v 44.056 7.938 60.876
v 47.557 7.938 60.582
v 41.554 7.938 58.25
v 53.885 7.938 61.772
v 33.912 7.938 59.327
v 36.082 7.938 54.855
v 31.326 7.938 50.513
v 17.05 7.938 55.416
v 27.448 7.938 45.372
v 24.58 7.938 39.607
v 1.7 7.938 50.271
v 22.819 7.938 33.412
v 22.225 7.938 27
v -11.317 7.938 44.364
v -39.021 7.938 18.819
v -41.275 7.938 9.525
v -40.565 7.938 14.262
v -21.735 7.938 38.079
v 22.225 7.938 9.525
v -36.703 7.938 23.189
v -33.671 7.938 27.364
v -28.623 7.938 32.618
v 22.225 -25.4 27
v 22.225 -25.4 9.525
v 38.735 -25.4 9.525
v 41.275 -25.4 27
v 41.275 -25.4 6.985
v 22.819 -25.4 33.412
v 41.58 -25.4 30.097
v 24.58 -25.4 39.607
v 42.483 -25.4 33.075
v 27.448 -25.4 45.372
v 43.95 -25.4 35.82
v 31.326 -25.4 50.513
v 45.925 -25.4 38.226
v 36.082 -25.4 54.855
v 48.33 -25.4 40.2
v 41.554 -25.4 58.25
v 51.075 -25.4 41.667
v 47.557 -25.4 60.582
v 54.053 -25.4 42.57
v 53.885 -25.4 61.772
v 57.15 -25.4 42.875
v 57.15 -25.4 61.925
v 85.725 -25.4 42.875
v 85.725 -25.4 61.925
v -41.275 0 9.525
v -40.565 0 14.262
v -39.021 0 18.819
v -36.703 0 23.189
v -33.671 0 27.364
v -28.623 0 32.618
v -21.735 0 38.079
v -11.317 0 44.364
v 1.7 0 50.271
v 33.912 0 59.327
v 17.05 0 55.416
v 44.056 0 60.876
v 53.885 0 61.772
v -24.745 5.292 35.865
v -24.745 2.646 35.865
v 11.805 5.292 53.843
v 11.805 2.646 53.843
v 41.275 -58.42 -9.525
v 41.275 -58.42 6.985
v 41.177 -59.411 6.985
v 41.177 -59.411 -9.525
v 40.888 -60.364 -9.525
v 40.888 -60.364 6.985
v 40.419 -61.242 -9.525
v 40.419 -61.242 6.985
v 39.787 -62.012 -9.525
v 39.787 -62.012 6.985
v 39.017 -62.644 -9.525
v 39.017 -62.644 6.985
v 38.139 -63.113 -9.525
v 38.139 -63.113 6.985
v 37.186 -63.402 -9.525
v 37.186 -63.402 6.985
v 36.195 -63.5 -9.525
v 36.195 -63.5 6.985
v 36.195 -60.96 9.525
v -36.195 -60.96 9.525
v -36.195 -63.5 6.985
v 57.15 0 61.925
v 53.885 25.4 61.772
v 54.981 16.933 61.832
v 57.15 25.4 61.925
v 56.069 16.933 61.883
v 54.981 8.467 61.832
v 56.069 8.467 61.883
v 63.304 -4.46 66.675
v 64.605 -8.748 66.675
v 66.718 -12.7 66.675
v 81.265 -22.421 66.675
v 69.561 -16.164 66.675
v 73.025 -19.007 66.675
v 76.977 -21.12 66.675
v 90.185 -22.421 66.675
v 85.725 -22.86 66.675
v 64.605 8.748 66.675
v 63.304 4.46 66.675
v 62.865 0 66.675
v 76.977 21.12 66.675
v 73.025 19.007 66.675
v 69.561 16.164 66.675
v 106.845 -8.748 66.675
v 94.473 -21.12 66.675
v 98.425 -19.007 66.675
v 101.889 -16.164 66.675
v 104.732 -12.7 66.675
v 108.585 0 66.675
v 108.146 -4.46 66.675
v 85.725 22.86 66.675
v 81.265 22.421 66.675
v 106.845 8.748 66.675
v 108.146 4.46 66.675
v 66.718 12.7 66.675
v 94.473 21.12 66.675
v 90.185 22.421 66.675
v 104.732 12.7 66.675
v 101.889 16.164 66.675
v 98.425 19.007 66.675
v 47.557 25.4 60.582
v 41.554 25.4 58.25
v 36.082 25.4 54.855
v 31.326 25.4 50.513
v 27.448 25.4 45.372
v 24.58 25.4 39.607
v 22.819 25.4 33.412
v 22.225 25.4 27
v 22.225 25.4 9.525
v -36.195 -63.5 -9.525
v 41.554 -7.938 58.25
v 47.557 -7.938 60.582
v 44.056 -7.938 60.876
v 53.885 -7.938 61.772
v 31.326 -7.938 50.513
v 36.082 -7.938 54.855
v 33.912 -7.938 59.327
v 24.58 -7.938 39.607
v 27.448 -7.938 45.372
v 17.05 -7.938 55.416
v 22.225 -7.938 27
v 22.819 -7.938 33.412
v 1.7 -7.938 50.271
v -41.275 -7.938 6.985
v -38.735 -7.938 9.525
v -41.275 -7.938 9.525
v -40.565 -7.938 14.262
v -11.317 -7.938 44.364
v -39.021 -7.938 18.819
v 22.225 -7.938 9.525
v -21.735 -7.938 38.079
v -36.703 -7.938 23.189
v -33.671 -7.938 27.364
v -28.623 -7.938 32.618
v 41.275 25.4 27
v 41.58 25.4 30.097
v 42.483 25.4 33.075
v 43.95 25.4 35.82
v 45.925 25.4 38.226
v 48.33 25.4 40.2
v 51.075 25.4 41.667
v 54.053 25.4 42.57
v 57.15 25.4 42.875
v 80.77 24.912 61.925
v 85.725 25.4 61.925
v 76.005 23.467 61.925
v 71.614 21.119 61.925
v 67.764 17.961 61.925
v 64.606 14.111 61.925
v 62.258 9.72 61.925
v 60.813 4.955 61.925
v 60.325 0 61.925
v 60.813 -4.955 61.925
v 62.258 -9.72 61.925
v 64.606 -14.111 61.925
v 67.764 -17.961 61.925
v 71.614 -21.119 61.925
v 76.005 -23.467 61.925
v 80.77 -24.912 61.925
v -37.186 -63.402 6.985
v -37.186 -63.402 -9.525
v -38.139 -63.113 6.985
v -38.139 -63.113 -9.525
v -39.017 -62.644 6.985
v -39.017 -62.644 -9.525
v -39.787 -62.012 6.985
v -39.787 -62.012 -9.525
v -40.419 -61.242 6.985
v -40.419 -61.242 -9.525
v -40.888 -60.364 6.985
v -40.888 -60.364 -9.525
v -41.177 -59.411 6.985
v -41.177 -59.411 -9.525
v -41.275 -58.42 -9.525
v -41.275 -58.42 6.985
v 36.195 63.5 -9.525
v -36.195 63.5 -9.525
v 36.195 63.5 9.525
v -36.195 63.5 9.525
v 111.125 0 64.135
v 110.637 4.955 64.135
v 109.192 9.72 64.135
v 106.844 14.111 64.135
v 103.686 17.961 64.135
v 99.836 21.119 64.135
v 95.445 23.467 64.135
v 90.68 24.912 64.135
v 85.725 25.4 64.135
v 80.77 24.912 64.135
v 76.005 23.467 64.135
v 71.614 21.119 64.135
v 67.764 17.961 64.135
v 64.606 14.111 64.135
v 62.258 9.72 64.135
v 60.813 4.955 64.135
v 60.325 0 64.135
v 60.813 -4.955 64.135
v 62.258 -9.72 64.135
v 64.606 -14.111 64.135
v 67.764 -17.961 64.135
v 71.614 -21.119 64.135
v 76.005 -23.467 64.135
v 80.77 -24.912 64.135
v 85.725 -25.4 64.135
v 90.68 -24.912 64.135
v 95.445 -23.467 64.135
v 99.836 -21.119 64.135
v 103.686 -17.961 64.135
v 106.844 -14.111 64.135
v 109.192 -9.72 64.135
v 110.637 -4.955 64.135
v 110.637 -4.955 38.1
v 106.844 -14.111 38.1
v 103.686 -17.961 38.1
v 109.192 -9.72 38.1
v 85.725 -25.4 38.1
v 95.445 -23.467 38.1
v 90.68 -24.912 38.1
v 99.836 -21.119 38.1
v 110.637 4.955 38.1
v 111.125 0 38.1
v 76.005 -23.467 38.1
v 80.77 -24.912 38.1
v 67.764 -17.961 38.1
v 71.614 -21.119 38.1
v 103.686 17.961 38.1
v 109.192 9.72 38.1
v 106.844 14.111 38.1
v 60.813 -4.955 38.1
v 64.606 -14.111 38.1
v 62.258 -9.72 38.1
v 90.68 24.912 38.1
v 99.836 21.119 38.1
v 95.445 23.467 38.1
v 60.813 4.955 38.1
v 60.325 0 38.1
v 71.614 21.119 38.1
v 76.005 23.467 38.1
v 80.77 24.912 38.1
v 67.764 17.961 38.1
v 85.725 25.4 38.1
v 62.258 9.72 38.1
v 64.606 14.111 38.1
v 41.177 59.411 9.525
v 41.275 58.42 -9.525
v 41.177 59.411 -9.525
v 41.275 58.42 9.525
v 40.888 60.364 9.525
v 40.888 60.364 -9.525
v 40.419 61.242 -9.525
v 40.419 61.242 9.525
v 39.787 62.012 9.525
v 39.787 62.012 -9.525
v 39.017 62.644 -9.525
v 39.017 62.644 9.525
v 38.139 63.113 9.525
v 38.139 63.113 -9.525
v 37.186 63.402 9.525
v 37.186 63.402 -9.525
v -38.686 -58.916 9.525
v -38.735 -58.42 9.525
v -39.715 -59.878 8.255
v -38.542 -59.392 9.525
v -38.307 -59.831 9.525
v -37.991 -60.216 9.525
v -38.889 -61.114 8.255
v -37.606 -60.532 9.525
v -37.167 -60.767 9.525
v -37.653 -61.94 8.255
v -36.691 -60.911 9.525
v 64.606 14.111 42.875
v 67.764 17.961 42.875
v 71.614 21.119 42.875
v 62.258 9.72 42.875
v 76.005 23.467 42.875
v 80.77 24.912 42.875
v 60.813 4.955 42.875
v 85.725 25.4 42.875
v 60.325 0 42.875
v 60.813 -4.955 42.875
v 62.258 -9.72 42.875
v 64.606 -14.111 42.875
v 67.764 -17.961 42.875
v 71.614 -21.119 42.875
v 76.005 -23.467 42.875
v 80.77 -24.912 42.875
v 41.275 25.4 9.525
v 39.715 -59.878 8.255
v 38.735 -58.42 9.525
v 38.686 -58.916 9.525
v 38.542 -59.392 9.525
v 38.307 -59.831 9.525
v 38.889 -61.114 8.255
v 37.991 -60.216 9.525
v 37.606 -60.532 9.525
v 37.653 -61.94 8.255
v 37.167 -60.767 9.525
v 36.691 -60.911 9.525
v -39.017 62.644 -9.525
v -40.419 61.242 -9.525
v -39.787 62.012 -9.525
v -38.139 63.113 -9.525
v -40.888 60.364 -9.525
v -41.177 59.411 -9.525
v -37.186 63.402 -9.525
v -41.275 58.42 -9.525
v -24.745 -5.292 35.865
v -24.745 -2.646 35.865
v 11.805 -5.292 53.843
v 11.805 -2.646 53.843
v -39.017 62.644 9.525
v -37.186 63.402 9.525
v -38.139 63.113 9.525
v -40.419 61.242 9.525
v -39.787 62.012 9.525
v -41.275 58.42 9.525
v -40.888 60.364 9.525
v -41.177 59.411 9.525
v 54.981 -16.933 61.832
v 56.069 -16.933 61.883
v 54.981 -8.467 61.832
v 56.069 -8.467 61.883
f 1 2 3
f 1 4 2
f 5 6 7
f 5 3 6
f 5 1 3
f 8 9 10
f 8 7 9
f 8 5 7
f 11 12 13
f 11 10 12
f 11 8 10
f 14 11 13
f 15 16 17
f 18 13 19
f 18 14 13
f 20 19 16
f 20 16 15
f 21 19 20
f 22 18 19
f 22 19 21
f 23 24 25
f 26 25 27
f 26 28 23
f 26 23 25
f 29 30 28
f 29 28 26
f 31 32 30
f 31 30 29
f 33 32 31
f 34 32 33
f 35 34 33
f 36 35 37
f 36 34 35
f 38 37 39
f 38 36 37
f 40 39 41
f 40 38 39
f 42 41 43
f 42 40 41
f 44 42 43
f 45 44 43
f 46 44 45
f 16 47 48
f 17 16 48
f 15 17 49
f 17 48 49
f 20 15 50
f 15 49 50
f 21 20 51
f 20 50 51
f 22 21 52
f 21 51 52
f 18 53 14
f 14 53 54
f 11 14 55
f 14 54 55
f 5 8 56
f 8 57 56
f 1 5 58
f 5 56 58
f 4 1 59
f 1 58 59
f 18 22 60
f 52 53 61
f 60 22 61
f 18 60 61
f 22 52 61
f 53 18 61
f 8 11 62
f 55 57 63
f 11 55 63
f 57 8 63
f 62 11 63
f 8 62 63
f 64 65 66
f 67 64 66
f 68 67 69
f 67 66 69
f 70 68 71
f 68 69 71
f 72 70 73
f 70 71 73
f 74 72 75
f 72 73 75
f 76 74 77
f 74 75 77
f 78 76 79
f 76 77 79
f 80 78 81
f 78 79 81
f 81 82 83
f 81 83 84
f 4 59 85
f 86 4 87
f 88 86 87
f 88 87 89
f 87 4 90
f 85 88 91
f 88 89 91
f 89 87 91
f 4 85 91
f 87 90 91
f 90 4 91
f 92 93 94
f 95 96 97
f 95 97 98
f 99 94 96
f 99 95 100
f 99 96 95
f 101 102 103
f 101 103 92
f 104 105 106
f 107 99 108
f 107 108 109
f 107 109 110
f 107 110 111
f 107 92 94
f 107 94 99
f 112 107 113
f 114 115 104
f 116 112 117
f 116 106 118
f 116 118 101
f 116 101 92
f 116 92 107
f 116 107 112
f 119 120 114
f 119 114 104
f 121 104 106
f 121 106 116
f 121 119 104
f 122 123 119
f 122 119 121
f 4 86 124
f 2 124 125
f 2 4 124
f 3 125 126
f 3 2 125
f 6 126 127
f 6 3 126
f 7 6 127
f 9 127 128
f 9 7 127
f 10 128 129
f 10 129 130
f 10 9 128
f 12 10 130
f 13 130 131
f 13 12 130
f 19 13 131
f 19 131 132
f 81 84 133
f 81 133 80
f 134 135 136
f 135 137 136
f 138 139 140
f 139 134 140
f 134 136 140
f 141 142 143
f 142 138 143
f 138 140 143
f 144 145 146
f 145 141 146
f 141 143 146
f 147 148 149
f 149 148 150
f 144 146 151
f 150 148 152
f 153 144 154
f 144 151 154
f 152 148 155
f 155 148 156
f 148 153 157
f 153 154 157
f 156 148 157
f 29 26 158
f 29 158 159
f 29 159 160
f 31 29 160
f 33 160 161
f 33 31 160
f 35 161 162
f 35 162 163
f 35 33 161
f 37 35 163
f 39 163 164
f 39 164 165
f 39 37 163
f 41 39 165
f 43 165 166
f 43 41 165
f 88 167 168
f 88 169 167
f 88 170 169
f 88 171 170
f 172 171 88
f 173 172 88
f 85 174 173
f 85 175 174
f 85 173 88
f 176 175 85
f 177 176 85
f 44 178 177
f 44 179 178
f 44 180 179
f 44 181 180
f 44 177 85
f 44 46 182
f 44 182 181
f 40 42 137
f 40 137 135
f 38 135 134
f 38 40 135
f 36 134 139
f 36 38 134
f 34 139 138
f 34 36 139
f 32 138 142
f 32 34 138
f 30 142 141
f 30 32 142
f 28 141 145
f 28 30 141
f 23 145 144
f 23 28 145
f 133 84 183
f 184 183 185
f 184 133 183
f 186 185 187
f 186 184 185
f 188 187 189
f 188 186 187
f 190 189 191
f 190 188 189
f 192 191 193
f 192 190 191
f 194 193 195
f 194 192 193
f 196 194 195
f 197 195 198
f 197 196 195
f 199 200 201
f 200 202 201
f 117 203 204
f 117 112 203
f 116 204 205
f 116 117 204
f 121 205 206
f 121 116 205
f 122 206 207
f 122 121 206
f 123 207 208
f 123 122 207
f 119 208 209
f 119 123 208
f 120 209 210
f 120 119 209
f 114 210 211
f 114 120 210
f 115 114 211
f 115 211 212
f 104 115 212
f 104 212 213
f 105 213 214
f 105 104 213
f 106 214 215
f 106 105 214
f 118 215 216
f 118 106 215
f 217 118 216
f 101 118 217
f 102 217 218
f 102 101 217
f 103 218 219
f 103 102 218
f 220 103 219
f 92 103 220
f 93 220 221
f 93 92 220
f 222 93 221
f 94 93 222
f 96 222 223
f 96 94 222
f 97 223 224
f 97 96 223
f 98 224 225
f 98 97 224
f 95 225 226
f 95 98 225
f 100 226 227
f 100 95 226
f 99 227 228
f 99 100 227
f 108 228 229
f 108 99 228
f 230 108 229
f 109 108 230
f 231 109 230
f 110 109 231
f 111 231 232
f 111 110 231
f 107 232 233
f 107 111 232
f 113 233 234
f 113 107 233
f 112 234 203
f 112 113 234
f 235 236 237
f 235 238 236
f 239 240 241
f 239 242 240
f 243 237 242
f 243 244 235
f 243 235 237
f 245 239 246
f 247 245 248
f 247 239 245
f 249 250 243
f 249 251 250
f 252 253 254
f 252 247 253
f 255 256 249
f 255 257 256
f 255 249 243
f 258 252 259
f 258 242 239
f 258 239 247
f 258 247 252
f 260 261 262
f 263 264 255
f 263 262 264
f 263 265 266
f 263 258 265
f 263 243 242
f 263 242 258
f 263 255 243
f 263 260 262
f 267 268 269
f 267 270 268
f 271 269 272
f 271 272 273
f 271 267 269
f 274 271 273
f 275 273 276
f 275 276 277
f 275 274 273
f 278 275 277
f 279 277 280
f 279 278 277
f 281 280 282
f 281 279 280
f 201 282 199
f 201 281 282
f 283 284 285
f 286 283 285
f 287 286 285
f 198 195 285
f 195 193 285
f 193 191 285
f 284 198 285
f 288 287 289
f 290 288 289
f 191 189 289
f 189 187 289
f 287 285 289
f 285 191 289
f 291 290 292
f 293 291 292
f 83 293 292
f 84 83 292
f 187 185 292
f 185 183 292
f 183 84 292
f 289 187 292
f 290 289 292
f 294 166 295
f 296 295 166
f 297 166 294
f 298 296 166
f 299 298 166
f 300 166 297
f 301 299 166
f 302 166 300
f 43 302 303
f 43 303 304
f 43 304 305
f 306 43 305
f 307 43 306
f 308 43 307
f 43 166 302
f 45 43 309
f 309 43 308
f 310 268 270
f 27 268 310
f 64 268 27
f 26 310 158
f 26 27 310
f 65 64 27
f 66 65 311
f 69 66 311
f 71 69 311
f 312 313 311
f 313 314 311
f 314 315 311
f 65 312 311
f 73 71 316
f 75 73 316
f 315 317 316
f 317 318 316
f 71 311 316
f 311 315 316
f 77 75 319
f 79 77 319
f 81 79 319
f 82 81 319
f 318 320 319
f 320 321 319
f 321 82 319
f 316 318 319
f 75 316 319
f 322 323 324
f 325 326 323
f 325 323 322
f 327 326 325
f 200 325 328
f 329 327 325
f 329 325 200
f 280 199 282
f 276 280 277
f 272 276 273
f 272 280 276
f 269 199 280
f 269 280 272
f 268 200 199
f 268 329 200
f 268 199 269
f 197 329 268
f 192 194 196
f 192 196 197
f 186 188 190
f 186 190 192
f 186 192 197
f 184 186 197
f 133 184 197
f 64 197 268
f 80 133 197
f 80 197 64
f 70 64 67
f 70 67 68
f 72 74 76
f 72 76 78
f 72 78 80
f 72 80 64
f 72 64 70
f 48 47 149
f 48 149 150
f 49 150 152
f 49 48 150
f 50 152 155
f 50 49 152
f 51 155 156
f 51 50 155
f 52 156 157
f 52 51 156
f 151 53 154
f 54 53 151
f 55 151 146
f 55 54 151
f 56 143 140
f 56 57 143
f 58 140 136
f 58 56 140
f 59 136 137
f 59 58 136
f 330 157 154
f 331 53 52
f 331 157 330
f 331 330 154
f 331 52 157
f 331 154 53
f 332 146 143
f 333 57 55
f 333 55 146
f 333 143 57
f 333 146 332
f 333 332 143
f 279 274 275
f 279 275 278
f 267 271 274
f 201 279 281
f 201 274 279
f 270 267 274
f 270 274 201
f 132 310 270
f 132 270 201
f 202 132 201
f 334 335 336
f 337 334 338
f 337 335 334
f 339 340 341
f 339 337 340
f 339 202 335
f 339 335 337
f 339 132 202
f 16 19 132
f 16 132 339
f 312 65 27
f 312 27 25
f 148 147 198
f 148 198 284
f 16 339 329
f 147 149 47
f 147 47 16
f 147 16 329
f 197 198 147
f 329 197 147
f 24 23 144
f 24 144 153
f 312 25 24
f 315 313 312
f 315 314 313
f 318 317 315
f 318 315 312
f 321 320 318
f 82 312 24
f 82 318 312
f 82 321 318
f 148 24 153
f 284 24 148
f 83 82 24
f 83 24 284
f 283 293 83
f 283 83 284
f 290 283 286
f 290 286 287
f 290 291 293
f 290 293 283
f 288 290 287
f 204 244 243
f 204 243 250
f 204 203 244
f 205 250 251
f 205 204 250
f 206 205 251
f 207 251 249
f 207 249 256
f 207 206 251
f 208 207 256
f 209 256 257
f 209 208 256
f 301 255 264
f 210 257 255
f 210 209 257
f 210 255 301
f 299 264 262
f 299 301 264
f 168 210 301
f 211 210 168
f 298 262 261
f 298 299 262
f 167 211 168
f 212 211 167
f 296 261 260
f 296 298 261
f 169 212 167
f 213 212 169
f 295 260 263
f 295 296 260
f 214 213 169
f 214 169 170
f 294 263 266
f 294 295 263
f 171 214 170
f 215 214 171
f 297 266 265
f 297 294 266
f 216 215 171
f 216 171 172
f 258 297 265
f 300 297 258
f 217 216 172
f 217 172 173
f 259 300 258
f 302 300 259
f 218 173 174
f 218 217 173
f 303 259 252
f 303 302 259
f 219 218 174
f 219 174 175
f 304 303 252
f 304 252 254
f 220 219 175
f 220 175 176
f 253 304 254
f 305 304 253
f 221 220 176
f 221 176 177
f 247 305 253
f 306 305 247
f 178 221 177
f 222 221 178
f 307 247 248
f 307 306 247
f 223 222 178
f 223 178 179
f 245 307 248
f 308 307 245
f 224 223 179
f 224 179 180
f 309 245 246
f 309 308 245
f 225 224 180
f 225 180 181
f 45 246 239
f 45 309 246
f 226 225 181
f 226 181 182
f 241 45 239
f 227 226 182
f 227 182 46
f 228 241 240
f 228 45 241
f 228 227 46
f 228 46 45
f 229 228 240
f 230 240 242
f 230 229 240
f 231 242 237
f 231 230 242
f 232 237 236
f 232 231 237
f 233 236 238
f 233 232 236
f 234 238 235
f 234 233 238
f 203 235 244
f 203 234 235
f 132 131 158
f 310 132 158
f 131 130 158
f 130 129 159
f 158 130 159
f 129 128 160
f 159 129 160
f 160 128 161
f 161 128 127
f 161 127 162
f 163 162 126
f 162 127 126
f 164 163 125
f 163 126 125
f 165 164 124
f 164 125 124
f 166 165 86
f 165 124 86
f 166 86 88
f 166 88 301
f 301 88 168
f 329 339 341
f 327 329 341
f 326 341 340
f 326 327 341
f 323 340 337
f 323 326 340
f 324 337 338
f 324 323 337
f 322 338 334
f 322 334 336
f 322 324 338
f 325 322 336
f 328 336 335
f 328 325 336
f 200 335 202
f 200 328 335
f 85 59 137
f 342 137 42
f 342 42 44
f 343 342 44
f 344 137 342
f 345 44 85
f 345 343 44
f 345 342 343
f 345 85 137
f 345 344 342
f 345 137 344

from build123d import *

# Parameters (mm, degrees)
F1_DEPTH     = 63.5
F0_W         = 25.4
F0_H         = 19.05
F2_DEPTH     = 25.4
F3_DEPTH     = 7.9375
F5_R         = 5.08
F6_T1_DEPTH  = 72.39
F6_T3_DEPTH  = 33.02
F6_T5_DEPTH  = 50.4825
F6_T10_ANGLE = 90
F6_T12_ANGLE = 90


# Not quite as in the source:
# - a fillet or chamfer that OpenCascade refuses, or shapes differently, is made with other operations: its cross-section is extruded or revolved along the edge and cut away or added


with BuildPart() as f1:
    # F0 (on Front) → F1 (new body, symmetric)
    with BuildSketch(Plane.XZ):
        Polygon((22.225, 9.525), (-41.275, 9.525), (-41.275, -9.525), (41.275, -9.525), (41.275, 9.525), align=None)
    extrude(amount=F1_DEPTH, both=True)

    # F0 (on Front) → F2 (join, symmetric)
    with BuildSketch(Plane.XZ):
        with BuildLine():
            Line((22.225, 27.0002), (22.225, 9.525))
            Line((22.225, 9.525), (41.275, 9.525))
            Line((41.275, 9.525), (41.275, 27.0002))
            ThreePointArc((41.275, 27.0002), (45.9246798487, 38.2255201513), (57.15, 42.8752))
            Line((57.15, 42.8752), (60.325, 42.8752))
            Line((60.325, 42.8752), (60.325, 61.9252))
            Line((60.325, 61.9252), (57.15, 61.9252))
            add(Edge.make_bspline(
                [(53.8854342407, 61.7722898912), (54.9842067368, 61.8365871986), (56.0728453275, 61.8876096574), (57.15, 61.9252)],
                knots=[108.5245810491, 108.5245810491, 108.5245810491, 108.5245810491, 111.5045361635, 111.5045361635, 111.5045361635, 111.5045361635], degree=3))
            ThreePointArc((53.8854342407, 61.7722898912), (31.3258777096, 50.5133948686), (22.225, 27.0002))
        make_face()
        with Locations((73.025, 52.4002)):
            Rectangle(F0_W, F0_H)
    extrude(amount=F2_DEPTH, both=True)

    # F0 (on Front) → F3 (join, symmetric)
    with BuildSketch(Plane.XZ):
        with BuildLine():
            add(Edge.make_bspline(
                [(-41.275, 9.525), (-39.5856284224, 39.4828766469), (13.870125209, 59.4306981306), (53.8854342407, 61.7722898912)],
                knots=[0, 0, 0, 0, 108.5245810491, 108.5245810491, 108.5245810491, 108.5245810491], degree=3))
            Line((-41.275, 9.525), (22.225, 9.525))
            Line((22.225, 9.525), (22.225, 27.0002))
            ThreePointArc((22.225, 27.0002), (31.3258777096, 50.5133948686), (53.8854342407, 61.7722898912))
        make_face()
    extrude(amount=F3_DEPTH, both=True)

    # F0 (on Front) → F4 (revolve)
    with BuildSketch(Plane.XZ):
        Polygon((85.725, 66.675), (85.725, 61.9252), (85.725, 42.8752), (85.725, 38.1), (111.125, 38.1), (111.125, 66.675), align=None)
    revolve(axis=Axis((85.725, 0, 52.3875), (0, 0, 1)))

    # F5
    f5_edges = [f1.edges().sort_by_distance(p)[0] for p in [
        (41.275, -63.5, 0),
        (-41.275, -63.5, 0),
        (41.275, 63.5, 0),
        (-41.275, 63.5, 0),
    ]]
    fillet(f5_edges, radius=F5_R)

    # F6: chamfer of 2.54 on 6 edges, made by hand

    # F6_s2 → F6_t1 (cut)
    with BuildSketch(Plane.YZ.offset(-36.195)):
        Polygon((-60.96, 9.525), (-63.5, 6.985), (-63.5, 9.525), align=None)
    extrude(amount=F6_T1_DEPTH, mode=Mode.SUBTRACT)

    # F6_s4 → F6_t3 (cut)
    with BuildSketch(Plane.XZ.offset(25.4)):
        Polygon((41.275, 6.985), (38.735, 9.525), (41.275, 9.525), align=None)
    extrude(amount=F6_T3_DEPTH, mode=Mode.SUBTRACT)

    # F6_s6 → F6_t5 (cut)
    with BuildSketch(Plane.XZ.offset(7.9375)):
        Polygon((-41.275, 6.985), (-38.735, 9.525), (-41.275, 9.525), align=None)
    extrude(amount=F6_T5_DEPTH, mode=Mode.SUBTRACT)

    # F6_s7 → F6_t8 (revolve, cut)
    with BuildSketch(Plane.XZ):
        Polygon((111.125, 64.135), (108.585, 66.675), (111.125, 66.675), align=None)
    revolve(axis=Axis((85.725, 0, 66.675), (0, 0, 1)), mode=Mode.SUBTRACT)

    # F6_s9 → F6_t10 (revolve, cut)
    with BuildSketch(Plane.XZ.offset(58.42)):
        Polygon((41.275, 6.985), (38.735, 9.525), (41.275, 9.525), align=None)
    revolve(axis=Axis((36.195, -58.42, 9.525), (0, 0, -1)), revolution_arc=F6_T10_ANGLE, mode=Mode.SUBTRACT)

    # F6_s11 → F6_t12 (revolve, cut)
    with BuildSketch(Plane.XZ.offset(58.42)):
        Polygon((-38.735, 9.525), (-41.275, 6.985), (-41.275, 9.525), align=None)
    revolve(axis=Axis((-36.195, -58.42, 9.525), (0, 0, 1)), revolution_arc=F6_T12_ANGLE, mode=Mode.SUBTRACT)


solid = f1.part
